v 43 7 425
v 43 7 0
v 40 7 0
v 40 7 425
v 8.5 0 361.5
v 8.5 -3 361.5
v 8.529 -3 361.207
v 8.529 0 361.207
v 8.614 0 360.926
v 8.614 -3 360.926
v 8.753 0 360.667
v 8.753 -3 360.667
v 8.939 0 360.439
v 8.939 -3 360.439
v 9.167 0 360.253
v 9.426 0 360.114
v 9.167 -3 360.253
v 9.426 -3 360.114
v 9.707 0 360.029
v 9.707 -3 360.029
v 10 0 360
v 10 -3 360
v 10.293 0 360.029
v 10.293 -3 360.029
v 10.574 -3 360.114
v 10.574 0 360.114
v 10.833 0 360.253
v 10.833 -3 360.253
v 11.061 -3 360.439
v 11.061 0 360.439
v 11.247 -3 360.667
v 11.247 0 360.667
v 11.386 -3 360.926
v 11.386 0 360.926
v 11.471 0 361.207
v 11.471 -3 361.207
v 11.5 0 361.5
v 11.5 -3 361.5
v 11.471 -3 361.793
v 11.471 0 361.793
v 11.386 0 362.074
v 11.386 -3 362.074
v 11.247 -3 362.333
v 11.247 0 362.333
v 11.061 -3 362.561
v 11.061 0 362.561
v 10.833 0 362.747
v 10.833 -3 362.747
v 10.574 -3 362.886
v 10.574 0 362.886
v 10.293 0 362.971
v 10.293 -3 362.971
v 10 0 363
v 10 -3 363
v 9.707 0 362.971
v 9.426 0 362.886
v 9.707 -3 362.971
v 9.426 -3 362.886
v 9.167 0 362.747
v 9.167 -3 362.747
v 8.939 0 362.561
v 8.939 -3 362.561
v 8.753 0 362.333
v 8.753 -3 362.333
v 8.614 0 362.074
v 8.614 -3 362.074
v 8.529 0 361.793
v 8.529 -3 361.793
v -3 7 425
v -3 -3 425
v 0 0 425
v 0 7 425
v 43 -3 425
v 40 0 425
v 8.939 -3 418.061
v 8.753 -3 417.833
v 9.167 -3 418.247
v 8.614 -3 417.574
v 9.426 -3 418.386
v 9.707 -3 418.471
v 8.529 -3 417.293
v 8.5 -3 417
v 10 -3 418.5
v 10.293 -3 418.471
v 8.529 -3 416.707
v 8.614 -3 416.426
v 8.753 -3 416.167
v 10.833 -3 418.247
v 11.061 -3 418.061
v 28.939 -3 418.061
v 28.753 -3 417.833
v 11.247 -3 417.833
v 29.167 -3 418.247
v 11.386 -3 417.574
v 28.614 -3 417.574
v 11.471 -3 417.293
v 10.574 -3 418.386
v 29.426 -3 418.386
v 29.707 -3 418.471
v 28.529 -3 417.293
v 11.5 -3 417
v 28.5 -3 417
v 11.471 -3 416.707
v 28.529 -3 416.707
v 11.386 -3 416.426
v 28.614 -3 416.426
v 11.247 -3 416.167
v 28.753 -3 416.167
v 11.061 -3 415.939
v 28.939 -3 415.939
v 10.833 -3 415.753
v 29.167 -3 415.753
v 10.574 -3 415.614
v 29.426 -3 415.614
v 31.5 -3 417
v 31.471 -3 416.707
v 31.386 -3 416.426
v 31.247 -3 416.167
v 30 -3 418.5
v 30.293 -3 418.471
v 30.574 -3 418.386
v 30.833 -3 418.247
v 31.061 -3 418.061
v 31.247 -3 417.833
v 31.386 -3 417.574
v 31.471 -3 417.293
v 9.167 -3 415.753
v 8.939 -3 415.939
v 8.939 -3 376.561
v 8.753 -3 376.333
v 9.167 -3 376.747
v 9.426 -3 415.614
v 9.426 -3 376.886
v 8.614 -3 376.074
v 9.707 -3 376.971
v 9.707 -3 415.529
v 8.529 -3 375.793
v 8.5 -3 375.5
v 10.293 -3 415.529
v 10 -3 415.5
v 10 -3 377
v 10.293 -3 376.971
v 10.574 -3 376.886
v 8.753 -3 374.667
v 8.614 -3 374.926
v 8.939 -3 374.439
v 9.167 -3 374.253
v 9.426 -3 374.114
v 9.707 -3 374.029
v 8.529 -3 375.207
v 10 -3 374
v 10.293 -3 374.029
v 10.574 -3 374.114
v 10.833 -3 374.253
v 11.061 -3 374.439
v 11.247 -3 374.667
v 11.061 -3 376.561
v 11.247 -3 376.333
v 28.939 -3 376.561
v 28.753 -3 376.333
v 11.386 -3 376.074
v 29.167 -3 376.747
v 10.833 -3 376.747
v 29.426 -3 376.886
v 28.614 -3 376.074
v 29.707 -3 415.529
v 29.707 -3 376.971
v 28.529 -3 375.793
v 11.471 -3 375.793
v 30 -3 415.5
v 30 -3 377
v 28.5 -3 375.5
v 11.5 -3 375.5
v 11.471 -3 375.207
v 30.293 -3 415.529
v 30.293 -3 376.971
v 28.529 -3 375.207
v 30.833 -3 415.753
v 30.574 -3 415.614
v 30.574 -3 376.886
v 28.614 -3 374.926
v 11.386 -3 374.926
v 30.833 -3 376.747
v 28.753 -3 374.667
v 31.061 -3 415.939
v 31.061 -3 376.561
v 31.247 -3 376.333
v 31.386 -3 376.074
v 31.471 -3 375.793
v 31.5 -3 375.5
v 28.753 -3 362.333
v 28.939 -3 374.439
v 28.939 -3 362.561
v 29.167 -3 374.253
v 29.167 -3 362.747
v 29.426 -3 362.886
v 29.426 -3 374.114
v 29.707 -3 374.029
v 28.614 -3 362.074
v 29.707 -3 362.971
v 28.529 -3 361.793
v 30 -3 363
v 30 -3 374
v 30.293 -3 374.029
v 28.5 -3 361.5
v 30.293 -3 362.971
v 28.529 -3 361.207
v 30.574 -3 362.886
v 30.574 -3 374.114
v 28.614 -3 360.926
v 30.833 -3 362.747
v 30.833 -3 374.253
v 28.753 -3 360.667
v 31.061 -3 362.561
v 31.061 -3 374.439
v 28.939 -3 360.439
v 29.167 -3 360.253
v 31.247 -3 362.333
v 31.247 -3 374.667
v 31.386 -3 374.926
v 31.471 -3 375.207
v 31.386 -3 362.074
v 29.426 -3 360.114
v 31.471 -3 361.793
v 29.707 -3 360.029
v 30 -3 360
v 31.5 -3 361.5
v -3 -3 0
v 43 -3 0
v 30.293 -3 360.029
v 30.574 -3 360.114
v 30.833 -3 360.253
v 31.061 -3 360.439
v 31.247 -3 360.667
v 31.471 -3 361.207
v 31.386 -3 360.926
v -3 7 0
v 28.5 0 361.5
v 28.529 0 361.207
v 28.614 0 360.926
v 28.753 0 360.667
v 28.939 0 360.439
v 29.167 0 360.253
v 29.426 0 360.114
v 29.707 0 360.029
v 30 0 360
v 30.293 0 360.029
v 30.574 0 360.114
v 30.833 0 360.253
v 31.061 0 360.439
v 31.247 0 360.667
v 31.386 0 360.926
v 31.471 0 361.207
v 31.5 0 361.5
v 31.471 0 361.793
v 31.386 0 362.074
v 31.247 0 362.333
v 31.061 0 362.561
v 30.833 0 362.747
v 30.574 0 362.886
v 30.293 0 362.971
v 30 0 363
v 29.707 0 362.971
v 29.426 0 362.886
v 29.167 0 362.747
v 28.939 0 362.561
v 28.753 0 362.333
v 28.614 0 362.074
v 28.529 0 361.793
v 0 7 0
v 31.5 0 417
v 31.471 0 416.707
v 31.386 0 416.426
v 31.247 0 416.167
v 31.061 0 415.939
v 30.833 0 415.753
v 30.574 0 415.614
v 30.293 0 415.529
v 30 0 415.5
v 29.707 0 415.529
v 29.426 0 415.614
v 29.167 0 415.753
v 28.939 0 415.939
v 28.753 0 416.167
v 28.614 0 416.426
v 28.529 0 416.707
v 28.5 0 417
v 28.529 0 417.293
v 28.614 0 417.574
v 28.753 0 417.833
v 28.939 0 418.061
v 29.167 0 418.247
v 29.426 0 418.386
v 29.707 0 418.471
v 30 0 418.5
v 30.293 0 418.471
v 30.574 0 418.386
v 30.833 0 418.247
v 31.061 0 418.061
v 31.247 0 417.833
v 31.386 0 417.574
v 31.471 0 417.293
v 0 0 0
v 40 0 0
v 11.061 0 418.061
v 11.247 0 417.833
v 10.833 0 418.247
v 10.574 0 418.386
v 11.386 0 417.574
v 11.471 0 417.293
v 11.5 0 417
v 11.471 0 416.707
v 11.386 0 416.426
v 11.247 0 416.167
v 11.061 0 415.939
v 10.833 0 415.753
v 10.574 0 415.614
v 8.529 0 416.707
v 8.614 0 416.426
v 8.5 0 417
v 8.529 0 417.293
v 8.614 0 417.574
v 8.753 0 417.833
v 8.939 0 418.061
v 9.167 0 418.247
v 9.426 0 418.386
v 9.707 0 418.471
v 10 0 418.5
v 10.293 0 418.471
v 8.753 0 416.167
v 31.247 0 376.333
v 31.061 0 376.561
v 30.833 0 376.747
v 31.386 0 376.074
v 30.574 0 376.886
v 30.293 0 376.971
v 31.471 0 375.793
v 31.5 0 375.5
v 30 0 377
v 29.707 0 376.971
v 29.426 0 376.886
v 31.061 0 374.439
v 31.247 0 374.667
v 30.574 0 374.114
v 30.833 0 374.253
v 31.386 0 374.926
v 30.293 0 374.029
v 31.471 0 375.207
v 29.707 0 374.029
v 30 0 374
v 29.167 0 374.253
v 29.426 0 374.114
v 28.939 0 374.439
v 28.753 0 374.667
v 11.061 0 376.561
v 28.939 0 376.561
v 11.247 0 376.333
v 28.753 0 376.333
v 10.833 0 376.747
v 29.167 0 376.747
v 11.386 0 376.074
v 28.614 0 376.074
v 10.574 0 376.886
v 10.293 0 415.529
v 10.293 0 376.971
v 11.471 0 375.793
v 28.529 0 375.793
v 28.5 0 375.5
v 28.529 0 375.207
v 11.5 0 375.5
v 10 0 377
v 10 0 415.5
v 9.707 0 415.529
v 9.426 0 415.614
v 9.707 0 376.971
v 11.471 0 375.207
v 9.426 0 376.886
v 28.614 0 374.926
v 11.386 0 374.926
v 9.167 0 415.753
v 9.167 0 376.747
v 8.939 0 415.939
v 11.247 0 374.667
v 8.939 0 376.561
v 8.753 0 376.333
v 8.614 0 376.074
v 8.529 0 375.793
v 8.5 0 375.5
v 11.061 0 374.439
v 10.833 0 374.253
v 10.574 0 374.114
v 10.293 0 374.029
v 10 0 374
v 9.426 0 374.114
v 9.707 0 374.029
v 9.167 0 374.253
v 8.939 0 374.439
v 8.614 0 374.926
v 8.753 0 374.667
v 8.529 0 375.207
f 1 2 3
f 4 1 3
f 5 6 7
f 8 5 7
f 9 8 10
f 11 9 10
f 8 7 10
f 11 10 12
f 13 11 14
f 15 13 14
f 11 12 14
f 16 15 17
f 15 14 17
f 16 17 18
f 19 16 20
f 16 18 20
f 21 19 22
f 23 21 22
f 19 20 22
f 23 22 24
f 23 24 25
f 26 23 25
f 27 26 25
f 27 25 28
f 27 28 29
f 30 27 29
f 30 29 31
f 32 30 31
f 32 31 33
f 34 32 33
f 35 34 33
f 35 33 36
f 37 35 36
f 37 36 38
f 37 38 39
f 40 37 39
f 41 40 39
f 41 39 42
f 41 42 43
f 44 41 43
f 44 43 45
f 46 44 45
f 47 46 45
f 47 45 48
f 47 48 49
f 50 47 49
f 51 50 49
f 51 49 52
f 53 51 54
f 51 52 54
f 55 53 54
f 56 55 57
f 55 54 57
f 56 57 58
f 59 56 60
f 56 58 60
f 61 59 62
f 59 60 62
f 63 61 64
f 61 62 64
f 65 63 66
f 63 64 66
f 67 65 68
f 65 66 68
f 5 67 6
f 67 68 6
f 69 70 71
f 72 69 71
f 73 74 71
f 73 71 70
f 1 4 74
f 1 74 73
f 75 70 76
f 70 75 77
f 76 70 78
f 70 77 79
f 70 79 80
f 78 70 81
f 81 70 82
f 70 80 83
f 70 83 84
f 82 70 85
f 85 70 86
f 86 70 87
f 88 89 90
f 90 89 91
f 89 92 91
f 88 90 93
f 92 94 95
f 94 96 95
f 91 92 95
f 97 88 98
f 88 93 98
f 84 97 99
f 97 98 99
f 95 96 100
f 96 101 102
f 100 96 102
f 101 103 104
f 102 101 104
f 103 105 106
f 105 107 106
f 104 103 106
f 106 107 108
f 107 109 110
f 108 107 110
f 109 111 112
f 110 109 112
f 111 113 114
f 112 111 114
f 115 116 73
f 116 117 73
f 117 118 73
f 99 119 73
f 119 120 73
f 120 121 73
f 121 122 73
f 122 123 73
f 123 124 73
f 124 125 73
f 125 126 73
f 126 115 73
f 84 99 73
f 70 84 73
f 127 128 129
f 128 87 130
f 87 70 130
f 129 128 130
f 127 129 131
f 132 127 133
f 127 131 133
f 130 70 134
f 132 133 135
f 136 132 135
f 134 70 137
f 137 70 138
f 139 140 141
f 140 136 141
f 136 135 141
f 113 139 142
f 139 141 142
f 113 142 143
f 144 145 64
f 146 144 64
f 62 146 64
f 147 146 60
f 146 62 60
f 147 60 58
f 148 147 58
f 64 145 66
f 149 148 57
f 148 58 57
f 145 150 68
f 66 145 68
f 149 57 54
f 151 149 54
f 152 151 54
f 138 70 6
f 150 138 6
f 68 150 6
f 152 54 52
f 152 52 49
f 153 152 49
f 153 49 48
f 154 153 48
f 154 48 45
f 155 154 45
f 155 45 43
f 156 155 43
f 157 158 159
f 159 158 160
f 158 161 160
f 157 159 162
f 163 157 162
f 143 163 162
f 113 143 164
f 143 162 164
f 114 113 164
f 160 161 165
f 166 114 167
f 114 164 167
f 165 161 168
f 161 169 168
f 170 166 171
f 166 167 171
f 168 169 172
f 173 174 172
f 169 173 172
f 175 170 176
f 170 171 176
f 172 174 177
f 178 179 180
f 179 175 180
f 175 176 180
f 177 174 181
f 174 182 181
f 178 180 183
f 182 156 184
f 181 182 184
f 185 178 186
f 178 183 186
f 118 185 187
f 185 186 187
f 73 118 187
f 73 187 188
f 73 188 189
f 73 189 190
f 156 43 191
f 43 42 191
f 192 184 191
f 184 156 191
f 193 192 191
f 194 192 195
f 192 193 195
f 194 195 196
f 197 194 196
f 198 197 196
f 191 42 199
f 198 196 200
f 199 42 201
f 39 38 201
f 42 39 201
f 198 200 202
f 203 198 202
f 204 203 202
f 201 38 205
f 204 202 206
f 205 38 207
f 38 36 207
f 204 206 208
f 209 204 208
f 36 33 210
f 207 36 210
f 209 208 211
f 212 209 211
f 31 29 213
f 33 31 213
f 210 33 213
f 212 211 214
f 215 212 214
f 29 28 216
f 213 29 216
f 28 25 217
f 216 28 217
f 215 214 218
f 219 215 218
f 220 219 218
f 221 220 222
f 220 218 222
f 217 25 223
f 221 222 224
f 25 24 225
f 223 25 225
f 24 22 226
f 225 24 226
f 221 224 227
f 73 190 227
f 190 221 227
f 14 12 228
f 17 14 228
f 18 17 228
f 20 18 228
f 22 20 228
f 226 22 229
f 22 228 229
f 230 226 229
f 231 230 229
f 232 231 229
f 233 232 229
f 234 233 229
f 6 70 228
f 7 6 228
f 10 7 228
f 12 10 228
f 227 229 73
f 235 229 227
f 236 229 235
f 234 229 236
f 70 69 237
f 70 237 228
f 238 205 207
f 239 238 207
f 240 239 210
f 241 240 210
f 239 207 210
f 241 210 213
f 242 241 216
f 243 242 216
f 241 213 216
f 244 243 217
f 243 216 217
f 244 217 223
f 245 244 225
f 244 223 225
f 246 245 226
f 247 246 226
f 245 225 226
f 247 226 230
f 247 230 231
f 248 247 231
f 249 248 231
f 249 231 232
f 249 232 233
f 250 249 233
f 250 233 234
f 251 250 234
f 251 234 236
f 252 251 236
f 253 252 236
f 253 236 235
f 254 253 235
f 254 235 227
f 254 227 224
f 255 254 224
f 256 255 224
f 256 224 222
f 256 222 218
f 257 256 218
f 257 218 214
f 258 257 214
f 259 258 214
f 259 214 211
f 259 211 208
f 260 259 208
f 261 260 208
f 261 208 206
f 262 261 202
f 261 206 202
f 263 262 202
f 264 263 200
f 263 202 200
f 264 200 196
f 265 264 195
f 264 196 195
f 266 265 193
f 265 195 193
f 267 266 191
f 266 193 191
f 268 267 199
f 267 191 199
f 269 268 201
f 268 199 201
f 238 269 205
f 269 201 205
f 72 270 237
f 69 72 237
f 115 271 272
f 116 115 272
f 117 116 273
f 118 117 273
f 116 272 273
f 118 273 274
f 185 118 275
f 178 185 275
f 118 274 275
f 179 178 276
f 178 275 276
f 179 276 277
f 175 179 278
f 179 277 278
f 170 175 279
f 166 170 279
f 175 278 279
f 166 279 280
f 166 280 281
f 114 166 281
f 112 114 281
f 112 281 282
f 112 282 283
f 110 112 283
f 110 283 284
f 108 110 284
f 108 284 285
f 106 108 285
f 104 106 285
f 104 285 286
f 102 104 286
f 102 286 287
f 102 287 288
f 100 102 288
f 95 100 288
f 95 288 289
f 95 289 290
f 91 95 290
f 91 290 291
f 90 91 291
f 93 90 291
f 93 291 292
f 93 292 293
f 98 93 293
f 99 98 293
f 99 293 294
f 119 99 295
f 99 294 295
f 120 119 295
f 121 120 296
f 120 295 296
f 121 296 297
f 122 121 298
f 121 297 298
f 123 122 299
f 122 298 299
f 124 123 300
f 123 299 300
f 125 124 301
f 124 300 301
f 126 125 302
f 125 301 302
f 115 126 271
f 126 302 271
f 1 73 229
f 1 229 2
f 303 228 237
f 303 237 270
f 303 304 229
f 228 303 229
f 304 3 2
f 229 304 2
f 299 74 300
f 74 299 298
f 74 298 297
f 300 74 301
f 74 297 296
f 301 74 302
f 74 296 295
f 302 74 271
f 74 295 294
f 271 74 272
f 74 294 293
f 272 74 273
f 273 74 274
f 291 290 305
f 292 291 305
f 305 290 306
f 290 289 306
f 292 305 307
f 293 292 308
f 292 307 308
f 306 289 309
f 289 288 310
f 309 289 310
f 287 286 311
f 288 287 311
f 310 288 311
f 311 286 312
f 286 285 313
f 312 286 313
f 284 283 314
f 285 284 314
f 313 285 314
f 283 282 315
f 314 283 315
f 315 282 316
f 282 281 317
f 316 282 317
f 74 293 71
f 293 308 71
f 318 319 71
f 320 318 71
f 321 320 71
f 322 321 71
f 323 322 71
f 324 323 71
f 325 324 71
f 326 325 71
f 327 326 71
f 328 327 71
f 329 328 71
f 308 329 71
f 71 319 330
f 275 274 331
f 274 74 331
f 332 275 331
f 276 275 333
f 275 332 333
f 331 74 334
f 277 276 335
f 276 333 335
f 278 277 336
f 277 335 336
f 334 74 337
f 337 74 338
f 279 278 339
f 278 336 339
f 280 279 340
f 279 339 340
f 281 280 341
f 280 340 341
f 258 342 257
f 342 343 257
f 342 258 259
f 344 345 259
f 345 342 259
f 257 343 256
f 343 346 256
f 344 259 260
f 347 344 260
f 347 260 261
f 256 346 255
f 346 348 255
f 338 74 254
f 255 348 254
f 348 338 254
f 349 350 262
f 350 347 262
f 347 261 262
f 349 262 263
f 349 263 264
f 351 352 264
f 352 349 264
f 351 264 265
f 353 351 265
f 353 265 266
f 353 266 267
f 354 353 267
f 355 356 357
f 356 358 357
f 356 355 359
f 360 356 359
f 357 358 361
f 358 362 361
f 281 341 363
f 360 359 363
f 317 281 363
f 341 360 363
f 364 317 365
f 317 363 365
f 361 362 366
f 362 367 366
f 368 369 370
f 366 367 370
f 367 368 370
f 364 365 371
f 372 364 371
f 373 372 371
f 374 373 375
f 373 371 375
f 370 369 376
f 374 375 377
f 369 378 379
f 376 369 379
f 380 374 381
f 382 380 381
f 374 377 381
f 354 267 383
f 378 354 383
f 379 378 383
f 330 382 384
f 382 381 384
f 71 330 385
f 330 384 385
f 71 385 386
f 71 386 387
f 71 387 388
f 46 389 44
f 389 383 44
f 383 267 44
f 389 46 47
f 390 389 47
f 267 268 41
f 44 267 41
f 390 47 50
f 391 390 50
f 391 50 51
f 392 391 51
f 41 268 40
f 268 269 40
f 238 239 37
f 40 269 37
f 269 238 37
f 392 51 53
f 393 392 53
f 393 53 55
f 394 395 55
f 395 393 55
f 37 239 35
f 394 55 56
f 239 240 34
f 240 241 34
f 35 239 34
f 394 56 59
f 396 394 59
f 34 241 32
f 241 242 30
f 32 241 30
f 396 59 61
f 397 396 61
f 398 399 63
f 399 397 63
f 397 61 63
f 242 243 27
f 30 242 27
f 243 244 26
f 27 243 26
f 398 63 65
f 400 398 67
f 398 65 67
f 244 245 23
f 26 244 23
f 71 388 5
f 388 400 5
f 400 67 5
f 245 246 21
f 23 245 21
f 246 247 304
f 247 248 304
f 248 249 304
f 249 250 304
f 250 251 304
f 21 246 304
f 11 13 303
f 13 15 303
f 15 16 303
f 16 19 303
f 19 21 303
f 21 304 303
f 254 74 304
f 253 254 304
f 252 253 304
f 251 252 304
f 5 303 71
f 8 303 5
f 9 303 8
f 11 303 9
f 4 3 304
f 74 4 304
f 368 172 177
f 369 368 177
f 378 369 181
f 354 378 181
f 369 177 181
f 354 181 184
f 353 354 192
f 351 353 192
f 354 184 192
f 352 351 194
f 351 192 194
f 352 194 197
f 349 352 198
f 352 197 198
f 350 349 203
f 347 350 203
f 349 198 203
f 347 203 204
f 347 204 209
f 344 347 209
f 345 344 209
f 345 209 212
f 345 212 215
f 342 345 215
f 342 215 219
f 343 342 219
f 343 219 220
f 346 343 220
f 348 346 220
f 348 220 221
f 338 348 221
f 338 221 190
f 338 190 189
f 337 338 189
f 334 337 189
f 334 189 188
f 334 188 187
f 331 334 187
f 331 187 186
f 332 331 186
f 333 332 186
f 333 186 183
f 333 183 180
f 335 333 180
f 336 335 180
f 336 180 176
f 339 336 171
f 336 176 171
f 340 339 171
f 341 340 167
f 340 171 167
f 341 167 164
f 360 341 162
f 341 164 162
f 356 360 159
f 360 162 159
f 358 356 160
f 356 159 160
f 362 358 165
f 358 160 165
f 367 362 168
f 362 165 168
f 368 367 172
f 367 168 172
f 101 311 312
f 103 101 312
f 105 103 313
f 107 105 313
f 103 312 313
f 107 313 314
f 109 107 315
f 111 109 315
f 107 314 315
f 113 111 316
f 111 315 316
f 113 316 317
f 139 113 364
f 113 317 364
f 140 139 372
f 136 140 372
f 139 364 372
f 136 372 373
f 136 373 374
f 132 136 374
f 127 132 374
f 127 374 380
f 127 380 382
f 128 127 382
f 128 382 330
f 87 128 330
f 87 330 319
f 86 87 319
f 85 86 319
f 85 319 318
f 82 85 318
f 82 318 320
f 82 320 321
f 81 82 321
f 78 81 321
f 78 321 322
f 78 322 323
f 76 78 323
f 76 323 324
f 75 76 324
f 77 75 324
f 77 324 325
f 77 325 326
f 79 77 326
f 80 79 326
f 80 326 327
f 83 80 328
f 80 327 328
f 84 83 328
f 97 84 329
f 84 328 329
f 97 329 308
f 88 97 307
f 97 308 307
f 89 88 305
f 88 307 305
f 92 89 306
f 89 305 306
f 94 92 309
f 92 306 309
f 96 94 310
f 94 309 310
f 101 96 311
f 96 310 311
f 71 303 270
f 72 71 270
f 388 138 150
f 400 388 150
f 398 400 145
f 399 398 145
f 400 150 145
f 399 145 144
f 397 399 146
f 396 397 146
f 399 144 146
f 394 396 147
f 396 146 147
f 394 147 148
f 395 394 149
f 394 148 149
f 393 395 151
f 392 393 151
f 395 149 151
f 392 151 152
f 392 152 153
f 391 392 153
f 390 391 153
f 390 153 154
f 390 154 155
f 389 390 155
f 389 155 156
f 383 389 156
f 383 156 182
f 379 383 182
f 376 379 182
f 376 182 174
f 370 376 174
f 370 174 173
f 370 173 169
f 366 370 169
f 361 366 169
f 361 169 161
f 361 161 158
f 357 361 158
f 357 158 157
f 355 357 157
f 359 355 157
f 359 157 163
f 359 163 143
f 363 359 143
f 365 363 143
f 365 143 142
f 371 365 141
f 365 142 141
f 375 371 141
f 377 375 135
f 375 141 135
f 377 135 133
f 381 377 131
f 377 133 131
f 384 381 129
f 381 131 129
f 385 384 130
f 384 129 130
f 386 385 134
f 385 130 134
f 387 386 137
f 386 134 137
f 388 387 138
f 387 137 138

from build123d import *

# Parameters (mm, degrees)
BOSS_EXTRUDE1_DEPTH       = 425
F_3_0MM_DOWEL_HOLE1_D     = 3
F_3_0MM_DOWEL_HOLE1_DEPTH = 15
F_3_0MM_DOWEL_HOLE1_TIP   = 0.901290929
F_3_0MM_DOWEL_HOLE2_D     = 3
F_3_0MM_DOWEL_HOLE2_DEPTH = 15
F_3_0MM_DOWEL_HOLE2_TIP   = 0.901290929


with BuildPart() as part:
    # Sketch1 → Boss-Extrude1 (new body)
    with BuildSketch(Plane.XY):
        Polygon((0, 0), (0, 7), (-3, 7), (-3, -3), (43, -3), (43, 7), (40, 7), (40, 0), align=None)
    extrude(amount=BOSS_EXTRUDE1_DEPTH)

    # Ø3.0mm Dowel Hole1
    with Locations(Plane(origin=(0, 0, 0), x_dir=(1, 0, 0), z_dir=(0, 1, 0))):
        with Locations((10, -375.5), (30, -375.5), (30, -361.5), (10, -361.5)):
            Hole(F_3_0MM_DOWEL_HOLE1_D / 2, depth=F_3_0MM_DOWEL_HOLE1_DEPTH)
            with Locations((0, 0, -(F_3_0MM_DOWEL_HOLE1_DEPTH + F_3_0MM_DOWEL_HOLE1_TIP / 2))):  # 118° drill point
                Cone(0, F_3_0MM_DOWEL_HOLE1_D / 2, F_3_0MM_DOWEL_HOLE1_TIP, mode=Mode.SUBTRACT)

    # Ø3.0mm Dowel Hole2
    with Locations(Plane(origin=(0, -3, 0), x_dir=(-1, 0, 0), z_dir=(0, -1, 0))):
        with Locations((-30, -417), (-10, -417)):
            Hole(F_3_0MM_DOWEL_HOLE2_D / 2, depth=F_3_0MM_DOWEL_HOLE2_DEPTH)
            with Locations((0, 0, -(F_3_0MM_DOWEL_HOLE2_DEPTH + F_3_0MM_DOWEL_HOLE2_TIP / 2))):  # 118° drill point
                Cone(0, F_3_0MM_DOWEL_HOLE2_D / 2, F_3_0MM_DOWEL_HOLE2_TIP, mode=Mode.SUBTRACT)


solid = part.part
